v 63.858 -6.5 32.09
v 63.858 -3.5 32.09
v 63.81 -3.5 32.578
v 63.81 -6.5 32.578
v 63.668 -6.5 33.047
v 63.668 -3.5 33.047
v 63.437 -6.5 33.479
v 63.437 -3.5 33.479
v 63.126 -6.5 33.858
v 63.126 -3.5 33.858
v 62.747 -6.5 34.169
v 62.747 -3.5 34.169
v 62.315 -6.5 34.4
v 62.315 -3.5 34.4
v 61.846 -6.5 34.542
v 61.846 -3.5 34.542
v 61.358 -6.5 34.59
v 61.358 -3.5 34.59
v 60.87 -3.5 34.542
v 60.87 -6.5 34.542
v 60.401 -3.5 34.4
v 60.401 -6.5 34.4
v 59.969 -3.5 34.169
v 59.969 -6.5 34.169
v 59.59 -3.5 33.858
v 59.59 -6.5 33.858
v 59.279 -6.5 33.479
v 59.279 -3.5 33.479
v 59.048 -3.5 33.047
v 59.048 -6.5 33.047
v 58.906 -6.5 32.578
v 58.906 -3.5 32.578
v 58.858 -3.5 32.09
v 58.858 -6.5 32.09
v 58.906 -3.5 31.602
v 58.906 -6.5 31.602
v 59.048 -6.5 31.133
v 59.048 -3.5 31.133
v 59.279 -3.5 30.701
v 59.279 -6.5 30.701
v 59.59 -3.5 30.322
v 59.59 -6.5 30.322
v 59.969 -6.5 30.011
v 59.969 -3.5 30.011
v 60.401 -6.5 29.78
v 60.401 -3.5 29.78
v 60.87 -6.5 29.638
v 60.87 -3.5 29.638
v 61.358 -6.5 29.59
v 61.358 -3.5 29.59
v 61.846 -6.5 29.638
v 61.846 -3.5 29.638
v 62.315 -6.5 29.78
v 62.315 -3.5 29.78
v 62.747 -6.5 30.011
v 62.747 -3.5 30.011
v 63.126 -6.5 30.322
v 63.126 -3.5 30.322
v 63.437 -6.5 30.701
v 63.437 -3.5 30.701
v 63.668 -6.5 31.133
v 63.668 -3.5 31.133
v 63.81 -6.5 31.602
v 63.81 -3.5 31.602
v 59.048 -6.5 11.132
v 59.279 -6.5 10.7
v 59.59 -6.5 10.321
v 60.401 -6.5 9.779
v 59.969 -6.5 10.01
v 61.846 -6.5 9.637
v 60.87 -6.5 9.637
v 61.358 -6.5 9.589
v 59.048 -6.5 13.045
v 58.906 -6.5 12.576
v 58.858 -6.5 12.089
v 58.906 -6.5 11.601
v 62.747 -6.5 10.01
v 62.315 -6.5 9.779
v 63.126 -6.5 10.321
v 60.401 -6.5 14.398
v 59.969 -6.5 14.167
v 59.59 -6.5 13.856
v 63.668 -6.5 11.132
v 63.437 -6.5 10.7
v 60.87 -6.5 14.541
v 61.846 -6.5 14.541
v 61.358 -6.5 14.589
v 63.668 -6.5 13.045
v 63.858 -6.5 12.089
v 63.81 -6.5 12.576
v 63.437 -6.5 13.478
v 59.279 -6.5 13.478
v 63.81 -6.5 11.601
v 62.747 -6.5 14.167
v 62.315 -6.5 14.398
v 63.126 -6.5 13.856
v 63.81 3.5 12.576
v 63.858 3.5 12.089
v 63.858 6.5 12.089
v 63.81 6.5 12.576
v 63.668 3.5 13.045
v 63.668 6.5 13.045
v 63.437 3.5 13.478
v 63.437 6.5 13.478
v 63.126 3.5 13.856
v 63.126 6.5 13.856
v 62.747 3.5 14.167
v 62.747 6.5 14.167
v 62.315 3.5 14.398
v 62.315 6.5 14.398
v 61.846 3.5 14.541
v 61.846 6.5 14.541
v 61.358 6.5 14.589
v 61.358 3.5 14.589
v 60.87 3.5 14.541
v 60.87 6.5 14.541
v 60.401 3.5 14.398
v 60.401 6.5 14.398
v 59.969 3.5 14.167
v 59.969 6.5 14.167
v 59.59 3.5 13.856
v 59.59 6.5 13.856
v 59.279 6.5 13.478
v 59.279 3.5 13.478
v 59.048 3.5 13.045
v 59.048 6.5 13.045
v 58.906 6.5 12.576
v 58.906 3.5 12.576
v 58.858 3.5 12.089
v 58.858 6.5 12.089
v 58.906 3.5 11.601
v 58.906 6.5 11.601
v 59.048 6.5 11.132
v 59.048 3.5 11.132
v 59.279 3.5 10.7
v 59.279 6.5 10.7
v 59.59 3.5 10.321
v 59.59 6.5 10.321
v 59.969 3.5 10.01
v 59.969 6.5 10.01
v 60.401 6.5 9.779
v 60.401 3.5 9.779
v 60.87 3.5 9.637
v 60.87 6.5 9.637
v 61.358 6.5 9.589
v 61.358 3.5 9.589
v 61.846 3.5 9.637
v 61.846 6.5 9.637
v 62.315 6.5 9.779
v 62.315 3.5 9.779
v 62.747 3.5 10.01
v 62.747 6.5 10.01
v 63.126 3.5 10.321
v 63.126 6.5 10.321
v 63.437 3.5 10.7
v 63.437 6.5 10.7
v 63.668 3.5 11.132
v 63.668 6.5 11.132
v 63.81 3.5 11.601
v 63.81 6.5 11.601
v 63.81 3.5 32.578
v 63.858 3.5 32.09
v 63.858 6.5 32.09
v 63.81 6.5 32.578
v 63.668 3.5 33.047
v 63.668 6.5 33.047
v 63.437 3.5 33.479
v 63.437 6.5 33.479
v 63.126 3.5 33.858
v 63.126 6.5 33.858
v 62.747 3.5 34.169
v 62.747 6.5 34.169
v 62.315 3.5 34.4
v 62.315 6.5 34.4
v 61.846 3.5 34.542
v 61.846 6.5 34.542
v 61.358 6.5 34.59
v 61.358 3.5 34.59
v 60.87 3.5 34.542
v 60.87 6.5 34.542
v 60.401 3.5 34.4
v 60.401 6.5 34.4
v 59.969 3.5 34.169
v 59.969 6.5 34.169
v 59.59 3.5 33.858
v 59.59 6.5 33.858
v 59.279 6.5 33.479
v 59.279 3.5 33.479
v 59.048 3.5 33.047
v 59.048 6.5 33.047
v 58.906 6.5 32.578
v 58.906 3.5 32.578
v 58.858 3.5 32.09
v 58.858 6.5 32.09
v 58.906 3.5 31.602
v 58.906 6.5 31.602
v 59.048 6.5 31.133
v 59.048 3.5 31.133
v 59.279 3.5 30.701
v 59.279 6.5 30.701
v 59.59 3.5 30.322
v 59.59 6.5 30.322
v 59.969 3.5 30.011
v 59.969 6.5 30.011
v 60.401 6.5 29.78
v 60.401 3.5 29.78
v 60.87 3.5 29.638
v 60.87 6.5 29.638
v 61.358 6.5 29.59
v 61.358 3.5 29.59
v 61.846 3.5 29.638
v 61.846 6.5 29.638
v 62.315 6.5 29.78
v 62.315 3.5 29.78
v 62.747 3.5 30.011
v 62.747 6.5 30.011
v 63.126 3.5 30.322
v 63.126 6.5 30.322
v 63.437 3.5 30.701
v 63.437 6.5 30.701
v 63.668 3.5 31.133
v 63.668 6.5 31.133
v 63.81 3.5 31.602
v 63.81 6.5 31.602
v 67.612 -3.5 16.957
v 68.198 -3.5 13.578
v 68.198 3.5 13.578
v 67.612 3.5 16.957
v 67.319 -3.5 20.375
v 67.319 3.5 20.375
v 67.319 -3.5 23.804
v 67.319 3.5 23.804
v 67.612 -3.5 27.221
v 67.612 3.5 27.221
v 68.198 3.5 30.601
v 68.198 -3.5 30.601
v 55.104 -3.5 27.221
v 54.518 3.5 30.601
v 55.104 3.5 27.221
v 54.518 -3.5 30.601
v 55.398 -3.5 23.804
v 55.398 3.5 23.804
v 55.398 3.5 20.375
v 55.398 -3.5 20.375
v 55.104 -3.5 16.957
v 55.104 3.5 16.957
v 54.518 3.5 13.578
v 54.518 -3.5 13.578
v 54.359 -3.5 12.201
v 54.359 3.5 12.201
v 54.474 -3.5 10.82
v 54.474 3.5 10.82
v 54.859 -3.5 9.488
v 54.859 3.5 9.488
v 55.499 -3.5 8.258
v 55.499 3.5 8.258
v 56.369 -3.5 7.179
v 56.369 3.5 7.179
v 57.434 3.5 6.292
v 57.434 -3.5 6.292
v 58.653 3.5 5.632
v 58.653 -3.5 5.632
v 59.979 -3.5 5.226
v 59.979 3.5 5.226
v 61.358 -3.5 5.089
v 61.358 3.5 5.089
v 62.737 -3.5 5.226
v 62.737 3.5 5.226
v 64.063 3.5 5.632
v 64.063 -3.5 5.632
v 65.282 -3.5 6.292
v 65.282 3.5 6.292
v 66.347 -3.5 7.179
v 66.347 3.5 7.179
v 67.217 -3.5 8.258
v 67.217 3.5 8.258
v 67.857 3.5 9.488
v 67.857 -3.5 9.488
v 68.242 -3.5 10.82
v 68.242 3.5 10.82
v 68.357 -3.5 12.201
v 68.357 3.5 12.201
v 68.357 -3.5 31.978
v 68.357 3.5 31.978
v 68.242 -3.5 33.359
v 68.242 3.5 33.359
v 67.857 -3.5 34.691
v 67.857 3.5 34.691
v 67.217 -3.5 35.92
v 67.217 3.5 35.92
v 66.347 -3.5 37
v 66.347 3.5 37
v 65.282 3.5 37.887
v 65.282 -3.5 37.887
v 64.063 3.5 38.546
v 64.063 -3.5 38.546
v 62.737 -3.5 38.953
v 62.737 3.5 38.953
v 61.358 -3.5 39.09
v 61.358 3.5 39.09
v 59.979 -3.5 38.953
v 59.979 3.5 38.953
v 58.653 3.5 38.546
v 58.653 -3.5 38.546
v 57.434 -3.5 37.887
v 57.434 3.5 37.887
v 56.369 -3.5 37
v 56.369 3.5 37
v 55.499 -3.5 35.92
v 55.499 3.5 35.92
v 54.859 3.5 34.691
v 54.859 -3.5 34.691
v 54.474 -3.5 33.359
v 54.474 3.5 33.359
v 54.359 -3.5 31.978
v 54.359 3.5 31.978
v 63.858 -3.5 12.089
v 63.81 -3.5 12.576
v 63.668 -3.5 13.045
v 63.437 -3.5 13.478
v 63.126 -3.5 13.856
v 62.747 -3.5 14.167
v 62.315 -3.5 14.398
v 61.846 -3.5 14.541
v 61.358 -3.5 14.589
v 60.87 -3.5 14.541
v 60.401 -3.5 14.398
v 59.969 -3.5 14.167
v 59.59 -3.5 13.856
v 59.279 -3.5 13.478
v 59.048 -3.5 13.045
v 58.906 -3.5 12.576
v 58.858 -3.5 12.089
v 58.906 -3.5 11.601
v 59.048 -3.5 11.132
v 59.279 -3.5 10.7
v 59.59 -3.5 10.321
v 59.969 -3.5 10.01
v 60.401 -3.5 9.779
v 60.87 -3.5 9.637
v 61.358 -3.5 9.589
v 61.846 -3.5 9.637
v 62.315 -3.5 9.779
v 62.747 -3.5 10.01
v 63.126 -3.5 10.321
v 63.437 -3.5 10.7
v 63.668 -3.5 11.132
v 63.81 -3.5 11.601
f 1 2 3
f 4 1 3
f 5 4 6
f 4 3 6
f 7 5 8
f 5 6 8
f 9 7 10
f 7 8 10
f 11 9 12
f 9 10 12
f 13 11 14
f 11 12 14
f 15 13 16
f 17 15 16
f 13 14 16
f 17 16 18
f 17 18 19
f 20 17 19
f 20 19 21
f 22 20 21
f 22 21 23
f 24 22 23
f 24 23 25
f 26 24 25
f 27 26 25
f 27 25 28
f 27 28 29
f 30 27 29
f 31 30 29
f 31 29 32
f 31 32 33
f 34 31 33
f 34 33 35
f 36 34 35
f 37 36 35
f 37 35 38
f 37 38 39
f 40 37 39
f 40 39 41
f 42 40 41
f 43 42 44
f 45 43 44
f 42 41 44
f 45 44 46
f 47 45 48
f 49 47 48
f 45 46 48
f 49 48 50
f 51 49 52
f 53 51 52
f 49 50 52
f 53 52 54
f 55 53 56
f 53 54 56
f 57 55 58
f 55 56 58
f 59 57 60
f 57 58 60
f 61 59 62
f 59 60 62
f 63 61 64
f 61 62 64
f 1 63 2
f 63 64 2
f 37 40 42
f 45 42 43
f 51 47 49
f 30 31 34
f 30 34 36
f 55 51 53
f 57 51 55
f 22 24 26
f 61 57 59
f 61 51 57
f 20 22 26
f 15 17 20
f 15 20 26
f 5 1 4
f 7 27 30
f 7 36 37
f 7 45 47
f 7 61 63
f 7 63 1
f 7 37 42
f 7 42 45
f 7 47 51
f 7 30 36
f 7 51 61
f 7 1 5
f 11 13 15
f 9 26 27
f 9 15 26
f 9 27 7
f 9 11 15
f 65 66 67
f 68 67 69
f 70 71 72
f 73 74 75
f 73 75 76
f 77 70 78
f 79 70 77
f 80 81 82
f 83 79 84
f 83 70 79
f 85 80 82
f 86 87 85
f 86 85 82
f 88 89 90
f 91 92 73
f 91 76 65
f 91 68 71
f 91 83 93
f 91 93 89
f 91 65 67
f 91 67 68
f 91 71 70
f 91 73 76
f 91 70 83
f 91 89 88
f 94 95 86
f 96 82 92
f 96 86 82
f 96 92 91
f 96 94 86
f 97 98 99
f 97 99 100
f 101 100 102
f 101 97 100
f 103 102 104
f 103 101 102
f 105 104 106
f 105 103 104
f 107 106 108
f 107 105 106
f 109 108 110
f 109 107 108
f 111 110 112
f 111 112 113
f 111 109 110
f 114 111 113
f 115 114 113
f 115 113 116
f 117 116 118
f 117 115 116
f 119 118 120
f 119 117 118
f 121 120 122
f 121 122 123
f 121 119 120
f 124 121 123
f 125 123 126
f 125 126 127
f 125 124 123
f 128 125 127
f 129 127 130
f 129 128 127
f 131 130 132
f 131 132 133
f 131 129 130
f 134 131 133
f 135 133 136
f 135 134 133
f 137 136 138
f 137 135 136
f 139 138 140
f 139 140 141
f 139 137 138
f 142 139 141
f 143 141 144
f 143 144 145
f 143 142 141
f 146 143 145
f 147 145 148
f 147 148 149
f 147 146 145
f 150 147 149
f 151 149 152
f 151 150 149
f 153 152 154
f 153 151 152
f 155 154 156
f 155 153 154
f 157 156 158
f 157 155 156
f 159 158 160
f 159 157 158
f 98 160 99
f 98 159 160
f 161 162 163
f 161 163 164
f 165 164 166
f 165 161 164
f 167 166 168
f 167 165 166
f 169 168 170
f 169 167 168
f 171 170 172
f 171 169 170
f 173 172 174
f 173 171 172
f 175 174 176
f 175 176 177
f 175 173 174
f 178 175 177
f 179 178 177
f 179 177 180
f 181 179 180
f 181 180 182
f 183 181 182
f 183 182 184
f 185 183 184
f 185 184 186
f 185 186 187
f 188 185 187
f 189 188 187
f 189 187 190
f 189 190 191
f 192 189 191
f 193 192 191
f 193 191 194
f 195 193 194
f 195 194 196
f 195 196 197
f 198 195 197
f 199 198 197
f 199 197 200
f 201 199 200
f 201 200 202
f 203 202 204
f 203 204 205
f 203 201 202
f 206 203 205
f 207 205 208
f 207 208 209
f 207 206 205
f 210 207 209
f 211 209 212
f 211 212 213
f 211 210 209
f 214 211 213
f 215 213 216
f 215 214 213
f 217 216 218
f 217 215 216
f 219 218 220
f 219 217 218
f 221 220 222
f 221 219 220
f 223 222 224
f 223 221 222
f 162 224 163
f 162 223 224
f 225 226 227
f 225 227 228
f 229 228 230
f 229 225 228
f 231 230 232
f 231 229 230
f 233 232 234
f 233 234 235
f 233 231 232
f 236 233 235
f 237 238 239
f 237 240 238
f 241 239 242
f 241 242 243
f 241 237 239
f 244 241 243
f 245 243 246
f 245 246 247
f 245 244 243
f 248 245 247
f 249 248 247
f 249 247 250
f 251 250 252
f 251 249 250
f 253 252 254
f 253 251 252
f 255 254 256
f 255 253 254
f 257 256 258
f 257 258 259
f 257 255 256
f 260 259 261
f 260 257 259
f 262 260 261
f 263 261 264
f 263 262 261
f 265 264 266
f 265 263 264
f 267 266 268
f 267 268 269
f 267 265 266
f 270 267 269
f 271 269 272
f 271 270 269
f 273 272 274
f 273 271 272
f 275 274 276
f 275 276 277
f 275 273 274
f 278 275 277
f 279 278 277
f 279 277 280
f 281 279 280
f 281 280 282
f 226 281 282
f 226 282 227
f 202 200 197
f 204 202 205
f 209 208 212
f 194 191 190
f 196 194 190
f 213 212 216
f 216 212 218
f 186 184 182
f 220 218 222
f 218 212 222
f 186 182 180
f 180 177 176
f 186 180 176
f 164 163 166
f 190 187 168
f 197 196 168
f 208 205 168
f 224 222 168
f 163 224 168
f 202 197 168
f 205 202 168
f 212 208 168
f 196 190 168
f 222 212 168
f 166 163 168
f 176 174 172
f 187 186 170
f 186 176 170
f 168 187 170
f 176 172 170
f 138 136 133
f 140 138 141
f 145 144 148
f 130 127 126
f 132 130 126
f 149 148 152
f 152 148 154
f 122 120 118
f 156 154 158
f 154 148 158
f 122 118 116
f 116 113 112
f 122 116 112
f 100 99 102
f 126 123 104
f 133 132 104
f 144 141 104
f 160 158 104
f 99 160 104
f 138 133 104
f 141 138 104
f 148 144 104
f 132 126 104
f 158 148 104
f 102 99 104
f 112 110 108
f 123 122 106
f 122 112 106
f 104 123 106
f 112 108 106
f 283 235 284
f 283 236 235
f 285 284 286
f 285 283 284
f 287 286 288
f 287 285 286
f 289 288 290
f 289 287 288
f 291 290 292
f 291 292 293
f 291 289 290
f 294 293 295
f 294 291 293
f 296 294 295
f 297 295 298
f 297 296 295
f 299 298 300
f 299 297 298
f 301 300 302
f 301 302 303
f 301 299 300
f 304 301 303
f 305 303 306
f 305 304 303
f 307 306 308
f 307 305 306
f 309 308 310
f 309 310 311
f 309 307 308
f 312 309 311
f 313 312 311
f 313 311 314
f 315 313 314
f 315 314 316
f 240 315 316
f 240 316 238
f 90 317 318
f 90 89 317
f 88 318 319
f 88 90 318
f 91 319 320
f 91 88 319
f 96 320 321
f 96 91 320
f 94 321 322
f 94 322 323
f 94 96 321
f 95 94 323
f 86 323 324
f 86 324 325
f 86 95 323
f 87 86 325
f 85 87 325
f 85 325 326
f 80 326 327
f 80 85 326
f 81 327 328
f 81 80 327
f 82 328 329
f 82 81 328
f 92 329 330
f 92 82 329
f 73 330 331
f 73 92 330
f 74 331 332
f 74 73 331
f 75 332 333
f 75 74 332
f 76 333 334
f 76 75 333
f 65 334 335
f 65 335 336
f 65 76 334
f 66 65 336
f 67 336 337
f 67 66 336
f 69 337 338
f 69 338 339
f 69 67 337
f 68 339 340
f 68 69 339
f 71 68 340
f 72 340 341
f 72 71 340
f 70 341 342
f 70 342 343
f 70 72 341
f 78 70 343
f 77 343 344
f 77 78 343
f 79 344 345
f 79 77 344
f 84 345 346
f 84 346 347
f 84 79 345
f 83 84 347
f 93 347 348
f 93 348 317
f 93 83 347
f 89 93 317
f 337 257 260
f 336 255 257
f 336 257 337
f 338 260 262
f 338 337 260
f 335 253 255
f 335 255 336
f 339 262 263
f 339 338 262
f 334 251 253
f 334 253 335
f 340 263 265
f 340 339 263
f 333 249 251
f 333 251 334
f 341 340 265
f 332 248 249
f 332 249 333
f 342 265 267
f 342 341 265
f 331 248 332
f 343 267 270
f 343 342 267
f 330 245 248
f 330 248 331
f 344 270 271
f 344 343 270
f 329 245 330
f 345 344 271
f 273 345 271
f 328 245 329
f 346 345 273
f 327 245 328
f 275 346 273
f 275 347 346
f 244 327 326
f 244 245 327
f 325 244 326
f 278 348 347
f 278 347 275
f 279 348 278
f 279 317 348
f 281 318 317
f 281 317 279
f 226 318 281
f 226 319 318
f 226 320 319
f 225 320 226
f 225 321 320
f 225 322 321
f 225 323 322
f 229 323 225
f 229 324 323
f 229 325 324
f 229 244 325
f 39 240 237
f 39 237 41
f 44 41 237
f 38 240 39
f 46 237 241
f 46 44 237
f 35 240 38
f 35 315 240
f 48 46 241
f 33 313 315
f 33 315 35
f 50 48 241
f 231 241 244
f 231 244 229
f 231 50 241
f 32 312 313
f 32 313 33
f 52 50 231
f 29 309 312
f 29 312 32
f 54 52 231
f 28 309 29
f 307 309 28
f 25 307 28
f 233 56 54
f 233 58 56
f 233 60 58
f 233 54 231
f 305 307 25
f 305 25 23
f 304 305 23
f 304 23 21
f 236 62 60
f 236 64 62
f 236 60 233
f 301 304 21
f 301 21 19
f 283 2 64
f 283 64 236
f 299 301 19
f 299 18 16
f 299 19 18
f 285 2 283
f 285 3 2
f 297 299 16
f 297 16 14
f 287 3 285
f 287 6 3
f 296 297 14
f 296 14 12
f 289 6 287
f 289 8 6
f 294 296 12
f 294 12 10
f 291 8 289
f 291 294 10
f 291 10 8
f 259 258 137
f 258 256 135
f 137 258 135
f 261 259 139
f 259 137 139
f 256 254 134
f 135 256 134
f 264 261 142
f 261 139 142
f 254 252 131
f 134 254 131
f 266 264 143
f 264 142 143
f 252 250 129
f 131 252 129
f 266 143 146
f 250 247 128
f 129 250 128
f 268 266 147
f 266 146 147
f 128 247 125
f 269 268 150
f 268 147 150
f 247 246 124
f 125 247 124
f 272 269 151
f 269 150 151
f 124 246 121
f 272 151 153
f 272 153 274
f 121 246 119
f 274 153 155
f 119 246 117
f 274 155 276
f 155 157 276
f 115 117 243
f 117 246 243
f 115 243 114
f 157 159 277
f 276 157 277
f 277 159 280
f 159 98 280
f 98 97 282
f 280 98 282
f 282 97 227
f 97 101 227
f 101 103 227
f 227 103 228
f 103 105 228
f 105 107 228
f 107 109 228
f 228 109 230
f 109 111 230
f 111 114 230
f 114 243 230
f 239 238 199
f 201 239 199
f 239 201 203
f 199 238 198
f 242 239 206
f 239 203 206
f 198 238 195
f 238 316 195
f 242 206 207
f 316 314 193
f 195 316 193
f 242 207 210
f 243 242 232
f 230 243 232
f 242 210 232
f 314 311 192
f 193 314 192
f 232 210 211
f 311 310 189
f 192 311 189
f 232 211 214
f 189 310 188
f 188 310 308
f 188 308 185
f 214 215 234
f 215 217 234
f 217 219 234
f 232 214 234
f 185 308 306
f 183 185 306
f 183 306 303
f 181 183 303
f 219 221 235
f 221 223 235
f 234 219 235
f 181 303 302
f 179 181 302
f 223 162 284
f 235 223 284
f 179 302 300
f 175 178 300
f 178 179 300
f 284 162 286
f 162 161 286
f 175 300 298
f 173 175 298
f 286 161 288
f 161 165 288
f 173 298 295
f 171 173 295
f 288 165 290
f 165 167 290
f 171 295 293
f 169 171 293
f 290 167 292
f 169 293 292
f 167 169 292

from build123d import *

# Parameters (mm, degrees)
F0_R     = 2.5
F1_DEPTH = 3.5
F2_R     = 2.5
F3_DEPTH = 6.5


with BuildPart() as f1:
    # F0 (on Front) → F1 (new body, symmetric)
    with BuildSketch(Plane.XZ):
        with BuildLine():
            ThreePointArc((54.518331, 30.600595), (55.434331, 22.08937), (54.518331, 13.578145))
            ThreePointArc((54.518331, 13.578145), (61.358031, 5.088681), (68.197731, 13.578145))
            ThreePointArc((68.197731, 13.578145), (67.281731, 22.08937), (68.197731, 30.600595))
            ThreePointArc((68.197731, 30.600595), (61.358031, 39.090059), (54.518331, 30.600595))
        make_face()
        with Locations((61.358031, 12.088681)):
            Circle(F0_R, mode=Mode.SUBTRACT)
        with Locations((61.358031, 32.090059)):
            Circle(F0_R, mode=Mode.SUBTRACT)
    extrude(amount=F1_DEPTH, both=True)

    # F2 (on Front) → F3 (join, symmetric)
    with BuildSketch(Plane.XZ):
        with Locations((61.358031, 32.090059)):
            Circle(F2_R)
        with Locations((61.358031, 12.088681)):
            Circle(F2_R)
    extrude(amount=F3_DEPTH, both=True)


solid = f1.part
